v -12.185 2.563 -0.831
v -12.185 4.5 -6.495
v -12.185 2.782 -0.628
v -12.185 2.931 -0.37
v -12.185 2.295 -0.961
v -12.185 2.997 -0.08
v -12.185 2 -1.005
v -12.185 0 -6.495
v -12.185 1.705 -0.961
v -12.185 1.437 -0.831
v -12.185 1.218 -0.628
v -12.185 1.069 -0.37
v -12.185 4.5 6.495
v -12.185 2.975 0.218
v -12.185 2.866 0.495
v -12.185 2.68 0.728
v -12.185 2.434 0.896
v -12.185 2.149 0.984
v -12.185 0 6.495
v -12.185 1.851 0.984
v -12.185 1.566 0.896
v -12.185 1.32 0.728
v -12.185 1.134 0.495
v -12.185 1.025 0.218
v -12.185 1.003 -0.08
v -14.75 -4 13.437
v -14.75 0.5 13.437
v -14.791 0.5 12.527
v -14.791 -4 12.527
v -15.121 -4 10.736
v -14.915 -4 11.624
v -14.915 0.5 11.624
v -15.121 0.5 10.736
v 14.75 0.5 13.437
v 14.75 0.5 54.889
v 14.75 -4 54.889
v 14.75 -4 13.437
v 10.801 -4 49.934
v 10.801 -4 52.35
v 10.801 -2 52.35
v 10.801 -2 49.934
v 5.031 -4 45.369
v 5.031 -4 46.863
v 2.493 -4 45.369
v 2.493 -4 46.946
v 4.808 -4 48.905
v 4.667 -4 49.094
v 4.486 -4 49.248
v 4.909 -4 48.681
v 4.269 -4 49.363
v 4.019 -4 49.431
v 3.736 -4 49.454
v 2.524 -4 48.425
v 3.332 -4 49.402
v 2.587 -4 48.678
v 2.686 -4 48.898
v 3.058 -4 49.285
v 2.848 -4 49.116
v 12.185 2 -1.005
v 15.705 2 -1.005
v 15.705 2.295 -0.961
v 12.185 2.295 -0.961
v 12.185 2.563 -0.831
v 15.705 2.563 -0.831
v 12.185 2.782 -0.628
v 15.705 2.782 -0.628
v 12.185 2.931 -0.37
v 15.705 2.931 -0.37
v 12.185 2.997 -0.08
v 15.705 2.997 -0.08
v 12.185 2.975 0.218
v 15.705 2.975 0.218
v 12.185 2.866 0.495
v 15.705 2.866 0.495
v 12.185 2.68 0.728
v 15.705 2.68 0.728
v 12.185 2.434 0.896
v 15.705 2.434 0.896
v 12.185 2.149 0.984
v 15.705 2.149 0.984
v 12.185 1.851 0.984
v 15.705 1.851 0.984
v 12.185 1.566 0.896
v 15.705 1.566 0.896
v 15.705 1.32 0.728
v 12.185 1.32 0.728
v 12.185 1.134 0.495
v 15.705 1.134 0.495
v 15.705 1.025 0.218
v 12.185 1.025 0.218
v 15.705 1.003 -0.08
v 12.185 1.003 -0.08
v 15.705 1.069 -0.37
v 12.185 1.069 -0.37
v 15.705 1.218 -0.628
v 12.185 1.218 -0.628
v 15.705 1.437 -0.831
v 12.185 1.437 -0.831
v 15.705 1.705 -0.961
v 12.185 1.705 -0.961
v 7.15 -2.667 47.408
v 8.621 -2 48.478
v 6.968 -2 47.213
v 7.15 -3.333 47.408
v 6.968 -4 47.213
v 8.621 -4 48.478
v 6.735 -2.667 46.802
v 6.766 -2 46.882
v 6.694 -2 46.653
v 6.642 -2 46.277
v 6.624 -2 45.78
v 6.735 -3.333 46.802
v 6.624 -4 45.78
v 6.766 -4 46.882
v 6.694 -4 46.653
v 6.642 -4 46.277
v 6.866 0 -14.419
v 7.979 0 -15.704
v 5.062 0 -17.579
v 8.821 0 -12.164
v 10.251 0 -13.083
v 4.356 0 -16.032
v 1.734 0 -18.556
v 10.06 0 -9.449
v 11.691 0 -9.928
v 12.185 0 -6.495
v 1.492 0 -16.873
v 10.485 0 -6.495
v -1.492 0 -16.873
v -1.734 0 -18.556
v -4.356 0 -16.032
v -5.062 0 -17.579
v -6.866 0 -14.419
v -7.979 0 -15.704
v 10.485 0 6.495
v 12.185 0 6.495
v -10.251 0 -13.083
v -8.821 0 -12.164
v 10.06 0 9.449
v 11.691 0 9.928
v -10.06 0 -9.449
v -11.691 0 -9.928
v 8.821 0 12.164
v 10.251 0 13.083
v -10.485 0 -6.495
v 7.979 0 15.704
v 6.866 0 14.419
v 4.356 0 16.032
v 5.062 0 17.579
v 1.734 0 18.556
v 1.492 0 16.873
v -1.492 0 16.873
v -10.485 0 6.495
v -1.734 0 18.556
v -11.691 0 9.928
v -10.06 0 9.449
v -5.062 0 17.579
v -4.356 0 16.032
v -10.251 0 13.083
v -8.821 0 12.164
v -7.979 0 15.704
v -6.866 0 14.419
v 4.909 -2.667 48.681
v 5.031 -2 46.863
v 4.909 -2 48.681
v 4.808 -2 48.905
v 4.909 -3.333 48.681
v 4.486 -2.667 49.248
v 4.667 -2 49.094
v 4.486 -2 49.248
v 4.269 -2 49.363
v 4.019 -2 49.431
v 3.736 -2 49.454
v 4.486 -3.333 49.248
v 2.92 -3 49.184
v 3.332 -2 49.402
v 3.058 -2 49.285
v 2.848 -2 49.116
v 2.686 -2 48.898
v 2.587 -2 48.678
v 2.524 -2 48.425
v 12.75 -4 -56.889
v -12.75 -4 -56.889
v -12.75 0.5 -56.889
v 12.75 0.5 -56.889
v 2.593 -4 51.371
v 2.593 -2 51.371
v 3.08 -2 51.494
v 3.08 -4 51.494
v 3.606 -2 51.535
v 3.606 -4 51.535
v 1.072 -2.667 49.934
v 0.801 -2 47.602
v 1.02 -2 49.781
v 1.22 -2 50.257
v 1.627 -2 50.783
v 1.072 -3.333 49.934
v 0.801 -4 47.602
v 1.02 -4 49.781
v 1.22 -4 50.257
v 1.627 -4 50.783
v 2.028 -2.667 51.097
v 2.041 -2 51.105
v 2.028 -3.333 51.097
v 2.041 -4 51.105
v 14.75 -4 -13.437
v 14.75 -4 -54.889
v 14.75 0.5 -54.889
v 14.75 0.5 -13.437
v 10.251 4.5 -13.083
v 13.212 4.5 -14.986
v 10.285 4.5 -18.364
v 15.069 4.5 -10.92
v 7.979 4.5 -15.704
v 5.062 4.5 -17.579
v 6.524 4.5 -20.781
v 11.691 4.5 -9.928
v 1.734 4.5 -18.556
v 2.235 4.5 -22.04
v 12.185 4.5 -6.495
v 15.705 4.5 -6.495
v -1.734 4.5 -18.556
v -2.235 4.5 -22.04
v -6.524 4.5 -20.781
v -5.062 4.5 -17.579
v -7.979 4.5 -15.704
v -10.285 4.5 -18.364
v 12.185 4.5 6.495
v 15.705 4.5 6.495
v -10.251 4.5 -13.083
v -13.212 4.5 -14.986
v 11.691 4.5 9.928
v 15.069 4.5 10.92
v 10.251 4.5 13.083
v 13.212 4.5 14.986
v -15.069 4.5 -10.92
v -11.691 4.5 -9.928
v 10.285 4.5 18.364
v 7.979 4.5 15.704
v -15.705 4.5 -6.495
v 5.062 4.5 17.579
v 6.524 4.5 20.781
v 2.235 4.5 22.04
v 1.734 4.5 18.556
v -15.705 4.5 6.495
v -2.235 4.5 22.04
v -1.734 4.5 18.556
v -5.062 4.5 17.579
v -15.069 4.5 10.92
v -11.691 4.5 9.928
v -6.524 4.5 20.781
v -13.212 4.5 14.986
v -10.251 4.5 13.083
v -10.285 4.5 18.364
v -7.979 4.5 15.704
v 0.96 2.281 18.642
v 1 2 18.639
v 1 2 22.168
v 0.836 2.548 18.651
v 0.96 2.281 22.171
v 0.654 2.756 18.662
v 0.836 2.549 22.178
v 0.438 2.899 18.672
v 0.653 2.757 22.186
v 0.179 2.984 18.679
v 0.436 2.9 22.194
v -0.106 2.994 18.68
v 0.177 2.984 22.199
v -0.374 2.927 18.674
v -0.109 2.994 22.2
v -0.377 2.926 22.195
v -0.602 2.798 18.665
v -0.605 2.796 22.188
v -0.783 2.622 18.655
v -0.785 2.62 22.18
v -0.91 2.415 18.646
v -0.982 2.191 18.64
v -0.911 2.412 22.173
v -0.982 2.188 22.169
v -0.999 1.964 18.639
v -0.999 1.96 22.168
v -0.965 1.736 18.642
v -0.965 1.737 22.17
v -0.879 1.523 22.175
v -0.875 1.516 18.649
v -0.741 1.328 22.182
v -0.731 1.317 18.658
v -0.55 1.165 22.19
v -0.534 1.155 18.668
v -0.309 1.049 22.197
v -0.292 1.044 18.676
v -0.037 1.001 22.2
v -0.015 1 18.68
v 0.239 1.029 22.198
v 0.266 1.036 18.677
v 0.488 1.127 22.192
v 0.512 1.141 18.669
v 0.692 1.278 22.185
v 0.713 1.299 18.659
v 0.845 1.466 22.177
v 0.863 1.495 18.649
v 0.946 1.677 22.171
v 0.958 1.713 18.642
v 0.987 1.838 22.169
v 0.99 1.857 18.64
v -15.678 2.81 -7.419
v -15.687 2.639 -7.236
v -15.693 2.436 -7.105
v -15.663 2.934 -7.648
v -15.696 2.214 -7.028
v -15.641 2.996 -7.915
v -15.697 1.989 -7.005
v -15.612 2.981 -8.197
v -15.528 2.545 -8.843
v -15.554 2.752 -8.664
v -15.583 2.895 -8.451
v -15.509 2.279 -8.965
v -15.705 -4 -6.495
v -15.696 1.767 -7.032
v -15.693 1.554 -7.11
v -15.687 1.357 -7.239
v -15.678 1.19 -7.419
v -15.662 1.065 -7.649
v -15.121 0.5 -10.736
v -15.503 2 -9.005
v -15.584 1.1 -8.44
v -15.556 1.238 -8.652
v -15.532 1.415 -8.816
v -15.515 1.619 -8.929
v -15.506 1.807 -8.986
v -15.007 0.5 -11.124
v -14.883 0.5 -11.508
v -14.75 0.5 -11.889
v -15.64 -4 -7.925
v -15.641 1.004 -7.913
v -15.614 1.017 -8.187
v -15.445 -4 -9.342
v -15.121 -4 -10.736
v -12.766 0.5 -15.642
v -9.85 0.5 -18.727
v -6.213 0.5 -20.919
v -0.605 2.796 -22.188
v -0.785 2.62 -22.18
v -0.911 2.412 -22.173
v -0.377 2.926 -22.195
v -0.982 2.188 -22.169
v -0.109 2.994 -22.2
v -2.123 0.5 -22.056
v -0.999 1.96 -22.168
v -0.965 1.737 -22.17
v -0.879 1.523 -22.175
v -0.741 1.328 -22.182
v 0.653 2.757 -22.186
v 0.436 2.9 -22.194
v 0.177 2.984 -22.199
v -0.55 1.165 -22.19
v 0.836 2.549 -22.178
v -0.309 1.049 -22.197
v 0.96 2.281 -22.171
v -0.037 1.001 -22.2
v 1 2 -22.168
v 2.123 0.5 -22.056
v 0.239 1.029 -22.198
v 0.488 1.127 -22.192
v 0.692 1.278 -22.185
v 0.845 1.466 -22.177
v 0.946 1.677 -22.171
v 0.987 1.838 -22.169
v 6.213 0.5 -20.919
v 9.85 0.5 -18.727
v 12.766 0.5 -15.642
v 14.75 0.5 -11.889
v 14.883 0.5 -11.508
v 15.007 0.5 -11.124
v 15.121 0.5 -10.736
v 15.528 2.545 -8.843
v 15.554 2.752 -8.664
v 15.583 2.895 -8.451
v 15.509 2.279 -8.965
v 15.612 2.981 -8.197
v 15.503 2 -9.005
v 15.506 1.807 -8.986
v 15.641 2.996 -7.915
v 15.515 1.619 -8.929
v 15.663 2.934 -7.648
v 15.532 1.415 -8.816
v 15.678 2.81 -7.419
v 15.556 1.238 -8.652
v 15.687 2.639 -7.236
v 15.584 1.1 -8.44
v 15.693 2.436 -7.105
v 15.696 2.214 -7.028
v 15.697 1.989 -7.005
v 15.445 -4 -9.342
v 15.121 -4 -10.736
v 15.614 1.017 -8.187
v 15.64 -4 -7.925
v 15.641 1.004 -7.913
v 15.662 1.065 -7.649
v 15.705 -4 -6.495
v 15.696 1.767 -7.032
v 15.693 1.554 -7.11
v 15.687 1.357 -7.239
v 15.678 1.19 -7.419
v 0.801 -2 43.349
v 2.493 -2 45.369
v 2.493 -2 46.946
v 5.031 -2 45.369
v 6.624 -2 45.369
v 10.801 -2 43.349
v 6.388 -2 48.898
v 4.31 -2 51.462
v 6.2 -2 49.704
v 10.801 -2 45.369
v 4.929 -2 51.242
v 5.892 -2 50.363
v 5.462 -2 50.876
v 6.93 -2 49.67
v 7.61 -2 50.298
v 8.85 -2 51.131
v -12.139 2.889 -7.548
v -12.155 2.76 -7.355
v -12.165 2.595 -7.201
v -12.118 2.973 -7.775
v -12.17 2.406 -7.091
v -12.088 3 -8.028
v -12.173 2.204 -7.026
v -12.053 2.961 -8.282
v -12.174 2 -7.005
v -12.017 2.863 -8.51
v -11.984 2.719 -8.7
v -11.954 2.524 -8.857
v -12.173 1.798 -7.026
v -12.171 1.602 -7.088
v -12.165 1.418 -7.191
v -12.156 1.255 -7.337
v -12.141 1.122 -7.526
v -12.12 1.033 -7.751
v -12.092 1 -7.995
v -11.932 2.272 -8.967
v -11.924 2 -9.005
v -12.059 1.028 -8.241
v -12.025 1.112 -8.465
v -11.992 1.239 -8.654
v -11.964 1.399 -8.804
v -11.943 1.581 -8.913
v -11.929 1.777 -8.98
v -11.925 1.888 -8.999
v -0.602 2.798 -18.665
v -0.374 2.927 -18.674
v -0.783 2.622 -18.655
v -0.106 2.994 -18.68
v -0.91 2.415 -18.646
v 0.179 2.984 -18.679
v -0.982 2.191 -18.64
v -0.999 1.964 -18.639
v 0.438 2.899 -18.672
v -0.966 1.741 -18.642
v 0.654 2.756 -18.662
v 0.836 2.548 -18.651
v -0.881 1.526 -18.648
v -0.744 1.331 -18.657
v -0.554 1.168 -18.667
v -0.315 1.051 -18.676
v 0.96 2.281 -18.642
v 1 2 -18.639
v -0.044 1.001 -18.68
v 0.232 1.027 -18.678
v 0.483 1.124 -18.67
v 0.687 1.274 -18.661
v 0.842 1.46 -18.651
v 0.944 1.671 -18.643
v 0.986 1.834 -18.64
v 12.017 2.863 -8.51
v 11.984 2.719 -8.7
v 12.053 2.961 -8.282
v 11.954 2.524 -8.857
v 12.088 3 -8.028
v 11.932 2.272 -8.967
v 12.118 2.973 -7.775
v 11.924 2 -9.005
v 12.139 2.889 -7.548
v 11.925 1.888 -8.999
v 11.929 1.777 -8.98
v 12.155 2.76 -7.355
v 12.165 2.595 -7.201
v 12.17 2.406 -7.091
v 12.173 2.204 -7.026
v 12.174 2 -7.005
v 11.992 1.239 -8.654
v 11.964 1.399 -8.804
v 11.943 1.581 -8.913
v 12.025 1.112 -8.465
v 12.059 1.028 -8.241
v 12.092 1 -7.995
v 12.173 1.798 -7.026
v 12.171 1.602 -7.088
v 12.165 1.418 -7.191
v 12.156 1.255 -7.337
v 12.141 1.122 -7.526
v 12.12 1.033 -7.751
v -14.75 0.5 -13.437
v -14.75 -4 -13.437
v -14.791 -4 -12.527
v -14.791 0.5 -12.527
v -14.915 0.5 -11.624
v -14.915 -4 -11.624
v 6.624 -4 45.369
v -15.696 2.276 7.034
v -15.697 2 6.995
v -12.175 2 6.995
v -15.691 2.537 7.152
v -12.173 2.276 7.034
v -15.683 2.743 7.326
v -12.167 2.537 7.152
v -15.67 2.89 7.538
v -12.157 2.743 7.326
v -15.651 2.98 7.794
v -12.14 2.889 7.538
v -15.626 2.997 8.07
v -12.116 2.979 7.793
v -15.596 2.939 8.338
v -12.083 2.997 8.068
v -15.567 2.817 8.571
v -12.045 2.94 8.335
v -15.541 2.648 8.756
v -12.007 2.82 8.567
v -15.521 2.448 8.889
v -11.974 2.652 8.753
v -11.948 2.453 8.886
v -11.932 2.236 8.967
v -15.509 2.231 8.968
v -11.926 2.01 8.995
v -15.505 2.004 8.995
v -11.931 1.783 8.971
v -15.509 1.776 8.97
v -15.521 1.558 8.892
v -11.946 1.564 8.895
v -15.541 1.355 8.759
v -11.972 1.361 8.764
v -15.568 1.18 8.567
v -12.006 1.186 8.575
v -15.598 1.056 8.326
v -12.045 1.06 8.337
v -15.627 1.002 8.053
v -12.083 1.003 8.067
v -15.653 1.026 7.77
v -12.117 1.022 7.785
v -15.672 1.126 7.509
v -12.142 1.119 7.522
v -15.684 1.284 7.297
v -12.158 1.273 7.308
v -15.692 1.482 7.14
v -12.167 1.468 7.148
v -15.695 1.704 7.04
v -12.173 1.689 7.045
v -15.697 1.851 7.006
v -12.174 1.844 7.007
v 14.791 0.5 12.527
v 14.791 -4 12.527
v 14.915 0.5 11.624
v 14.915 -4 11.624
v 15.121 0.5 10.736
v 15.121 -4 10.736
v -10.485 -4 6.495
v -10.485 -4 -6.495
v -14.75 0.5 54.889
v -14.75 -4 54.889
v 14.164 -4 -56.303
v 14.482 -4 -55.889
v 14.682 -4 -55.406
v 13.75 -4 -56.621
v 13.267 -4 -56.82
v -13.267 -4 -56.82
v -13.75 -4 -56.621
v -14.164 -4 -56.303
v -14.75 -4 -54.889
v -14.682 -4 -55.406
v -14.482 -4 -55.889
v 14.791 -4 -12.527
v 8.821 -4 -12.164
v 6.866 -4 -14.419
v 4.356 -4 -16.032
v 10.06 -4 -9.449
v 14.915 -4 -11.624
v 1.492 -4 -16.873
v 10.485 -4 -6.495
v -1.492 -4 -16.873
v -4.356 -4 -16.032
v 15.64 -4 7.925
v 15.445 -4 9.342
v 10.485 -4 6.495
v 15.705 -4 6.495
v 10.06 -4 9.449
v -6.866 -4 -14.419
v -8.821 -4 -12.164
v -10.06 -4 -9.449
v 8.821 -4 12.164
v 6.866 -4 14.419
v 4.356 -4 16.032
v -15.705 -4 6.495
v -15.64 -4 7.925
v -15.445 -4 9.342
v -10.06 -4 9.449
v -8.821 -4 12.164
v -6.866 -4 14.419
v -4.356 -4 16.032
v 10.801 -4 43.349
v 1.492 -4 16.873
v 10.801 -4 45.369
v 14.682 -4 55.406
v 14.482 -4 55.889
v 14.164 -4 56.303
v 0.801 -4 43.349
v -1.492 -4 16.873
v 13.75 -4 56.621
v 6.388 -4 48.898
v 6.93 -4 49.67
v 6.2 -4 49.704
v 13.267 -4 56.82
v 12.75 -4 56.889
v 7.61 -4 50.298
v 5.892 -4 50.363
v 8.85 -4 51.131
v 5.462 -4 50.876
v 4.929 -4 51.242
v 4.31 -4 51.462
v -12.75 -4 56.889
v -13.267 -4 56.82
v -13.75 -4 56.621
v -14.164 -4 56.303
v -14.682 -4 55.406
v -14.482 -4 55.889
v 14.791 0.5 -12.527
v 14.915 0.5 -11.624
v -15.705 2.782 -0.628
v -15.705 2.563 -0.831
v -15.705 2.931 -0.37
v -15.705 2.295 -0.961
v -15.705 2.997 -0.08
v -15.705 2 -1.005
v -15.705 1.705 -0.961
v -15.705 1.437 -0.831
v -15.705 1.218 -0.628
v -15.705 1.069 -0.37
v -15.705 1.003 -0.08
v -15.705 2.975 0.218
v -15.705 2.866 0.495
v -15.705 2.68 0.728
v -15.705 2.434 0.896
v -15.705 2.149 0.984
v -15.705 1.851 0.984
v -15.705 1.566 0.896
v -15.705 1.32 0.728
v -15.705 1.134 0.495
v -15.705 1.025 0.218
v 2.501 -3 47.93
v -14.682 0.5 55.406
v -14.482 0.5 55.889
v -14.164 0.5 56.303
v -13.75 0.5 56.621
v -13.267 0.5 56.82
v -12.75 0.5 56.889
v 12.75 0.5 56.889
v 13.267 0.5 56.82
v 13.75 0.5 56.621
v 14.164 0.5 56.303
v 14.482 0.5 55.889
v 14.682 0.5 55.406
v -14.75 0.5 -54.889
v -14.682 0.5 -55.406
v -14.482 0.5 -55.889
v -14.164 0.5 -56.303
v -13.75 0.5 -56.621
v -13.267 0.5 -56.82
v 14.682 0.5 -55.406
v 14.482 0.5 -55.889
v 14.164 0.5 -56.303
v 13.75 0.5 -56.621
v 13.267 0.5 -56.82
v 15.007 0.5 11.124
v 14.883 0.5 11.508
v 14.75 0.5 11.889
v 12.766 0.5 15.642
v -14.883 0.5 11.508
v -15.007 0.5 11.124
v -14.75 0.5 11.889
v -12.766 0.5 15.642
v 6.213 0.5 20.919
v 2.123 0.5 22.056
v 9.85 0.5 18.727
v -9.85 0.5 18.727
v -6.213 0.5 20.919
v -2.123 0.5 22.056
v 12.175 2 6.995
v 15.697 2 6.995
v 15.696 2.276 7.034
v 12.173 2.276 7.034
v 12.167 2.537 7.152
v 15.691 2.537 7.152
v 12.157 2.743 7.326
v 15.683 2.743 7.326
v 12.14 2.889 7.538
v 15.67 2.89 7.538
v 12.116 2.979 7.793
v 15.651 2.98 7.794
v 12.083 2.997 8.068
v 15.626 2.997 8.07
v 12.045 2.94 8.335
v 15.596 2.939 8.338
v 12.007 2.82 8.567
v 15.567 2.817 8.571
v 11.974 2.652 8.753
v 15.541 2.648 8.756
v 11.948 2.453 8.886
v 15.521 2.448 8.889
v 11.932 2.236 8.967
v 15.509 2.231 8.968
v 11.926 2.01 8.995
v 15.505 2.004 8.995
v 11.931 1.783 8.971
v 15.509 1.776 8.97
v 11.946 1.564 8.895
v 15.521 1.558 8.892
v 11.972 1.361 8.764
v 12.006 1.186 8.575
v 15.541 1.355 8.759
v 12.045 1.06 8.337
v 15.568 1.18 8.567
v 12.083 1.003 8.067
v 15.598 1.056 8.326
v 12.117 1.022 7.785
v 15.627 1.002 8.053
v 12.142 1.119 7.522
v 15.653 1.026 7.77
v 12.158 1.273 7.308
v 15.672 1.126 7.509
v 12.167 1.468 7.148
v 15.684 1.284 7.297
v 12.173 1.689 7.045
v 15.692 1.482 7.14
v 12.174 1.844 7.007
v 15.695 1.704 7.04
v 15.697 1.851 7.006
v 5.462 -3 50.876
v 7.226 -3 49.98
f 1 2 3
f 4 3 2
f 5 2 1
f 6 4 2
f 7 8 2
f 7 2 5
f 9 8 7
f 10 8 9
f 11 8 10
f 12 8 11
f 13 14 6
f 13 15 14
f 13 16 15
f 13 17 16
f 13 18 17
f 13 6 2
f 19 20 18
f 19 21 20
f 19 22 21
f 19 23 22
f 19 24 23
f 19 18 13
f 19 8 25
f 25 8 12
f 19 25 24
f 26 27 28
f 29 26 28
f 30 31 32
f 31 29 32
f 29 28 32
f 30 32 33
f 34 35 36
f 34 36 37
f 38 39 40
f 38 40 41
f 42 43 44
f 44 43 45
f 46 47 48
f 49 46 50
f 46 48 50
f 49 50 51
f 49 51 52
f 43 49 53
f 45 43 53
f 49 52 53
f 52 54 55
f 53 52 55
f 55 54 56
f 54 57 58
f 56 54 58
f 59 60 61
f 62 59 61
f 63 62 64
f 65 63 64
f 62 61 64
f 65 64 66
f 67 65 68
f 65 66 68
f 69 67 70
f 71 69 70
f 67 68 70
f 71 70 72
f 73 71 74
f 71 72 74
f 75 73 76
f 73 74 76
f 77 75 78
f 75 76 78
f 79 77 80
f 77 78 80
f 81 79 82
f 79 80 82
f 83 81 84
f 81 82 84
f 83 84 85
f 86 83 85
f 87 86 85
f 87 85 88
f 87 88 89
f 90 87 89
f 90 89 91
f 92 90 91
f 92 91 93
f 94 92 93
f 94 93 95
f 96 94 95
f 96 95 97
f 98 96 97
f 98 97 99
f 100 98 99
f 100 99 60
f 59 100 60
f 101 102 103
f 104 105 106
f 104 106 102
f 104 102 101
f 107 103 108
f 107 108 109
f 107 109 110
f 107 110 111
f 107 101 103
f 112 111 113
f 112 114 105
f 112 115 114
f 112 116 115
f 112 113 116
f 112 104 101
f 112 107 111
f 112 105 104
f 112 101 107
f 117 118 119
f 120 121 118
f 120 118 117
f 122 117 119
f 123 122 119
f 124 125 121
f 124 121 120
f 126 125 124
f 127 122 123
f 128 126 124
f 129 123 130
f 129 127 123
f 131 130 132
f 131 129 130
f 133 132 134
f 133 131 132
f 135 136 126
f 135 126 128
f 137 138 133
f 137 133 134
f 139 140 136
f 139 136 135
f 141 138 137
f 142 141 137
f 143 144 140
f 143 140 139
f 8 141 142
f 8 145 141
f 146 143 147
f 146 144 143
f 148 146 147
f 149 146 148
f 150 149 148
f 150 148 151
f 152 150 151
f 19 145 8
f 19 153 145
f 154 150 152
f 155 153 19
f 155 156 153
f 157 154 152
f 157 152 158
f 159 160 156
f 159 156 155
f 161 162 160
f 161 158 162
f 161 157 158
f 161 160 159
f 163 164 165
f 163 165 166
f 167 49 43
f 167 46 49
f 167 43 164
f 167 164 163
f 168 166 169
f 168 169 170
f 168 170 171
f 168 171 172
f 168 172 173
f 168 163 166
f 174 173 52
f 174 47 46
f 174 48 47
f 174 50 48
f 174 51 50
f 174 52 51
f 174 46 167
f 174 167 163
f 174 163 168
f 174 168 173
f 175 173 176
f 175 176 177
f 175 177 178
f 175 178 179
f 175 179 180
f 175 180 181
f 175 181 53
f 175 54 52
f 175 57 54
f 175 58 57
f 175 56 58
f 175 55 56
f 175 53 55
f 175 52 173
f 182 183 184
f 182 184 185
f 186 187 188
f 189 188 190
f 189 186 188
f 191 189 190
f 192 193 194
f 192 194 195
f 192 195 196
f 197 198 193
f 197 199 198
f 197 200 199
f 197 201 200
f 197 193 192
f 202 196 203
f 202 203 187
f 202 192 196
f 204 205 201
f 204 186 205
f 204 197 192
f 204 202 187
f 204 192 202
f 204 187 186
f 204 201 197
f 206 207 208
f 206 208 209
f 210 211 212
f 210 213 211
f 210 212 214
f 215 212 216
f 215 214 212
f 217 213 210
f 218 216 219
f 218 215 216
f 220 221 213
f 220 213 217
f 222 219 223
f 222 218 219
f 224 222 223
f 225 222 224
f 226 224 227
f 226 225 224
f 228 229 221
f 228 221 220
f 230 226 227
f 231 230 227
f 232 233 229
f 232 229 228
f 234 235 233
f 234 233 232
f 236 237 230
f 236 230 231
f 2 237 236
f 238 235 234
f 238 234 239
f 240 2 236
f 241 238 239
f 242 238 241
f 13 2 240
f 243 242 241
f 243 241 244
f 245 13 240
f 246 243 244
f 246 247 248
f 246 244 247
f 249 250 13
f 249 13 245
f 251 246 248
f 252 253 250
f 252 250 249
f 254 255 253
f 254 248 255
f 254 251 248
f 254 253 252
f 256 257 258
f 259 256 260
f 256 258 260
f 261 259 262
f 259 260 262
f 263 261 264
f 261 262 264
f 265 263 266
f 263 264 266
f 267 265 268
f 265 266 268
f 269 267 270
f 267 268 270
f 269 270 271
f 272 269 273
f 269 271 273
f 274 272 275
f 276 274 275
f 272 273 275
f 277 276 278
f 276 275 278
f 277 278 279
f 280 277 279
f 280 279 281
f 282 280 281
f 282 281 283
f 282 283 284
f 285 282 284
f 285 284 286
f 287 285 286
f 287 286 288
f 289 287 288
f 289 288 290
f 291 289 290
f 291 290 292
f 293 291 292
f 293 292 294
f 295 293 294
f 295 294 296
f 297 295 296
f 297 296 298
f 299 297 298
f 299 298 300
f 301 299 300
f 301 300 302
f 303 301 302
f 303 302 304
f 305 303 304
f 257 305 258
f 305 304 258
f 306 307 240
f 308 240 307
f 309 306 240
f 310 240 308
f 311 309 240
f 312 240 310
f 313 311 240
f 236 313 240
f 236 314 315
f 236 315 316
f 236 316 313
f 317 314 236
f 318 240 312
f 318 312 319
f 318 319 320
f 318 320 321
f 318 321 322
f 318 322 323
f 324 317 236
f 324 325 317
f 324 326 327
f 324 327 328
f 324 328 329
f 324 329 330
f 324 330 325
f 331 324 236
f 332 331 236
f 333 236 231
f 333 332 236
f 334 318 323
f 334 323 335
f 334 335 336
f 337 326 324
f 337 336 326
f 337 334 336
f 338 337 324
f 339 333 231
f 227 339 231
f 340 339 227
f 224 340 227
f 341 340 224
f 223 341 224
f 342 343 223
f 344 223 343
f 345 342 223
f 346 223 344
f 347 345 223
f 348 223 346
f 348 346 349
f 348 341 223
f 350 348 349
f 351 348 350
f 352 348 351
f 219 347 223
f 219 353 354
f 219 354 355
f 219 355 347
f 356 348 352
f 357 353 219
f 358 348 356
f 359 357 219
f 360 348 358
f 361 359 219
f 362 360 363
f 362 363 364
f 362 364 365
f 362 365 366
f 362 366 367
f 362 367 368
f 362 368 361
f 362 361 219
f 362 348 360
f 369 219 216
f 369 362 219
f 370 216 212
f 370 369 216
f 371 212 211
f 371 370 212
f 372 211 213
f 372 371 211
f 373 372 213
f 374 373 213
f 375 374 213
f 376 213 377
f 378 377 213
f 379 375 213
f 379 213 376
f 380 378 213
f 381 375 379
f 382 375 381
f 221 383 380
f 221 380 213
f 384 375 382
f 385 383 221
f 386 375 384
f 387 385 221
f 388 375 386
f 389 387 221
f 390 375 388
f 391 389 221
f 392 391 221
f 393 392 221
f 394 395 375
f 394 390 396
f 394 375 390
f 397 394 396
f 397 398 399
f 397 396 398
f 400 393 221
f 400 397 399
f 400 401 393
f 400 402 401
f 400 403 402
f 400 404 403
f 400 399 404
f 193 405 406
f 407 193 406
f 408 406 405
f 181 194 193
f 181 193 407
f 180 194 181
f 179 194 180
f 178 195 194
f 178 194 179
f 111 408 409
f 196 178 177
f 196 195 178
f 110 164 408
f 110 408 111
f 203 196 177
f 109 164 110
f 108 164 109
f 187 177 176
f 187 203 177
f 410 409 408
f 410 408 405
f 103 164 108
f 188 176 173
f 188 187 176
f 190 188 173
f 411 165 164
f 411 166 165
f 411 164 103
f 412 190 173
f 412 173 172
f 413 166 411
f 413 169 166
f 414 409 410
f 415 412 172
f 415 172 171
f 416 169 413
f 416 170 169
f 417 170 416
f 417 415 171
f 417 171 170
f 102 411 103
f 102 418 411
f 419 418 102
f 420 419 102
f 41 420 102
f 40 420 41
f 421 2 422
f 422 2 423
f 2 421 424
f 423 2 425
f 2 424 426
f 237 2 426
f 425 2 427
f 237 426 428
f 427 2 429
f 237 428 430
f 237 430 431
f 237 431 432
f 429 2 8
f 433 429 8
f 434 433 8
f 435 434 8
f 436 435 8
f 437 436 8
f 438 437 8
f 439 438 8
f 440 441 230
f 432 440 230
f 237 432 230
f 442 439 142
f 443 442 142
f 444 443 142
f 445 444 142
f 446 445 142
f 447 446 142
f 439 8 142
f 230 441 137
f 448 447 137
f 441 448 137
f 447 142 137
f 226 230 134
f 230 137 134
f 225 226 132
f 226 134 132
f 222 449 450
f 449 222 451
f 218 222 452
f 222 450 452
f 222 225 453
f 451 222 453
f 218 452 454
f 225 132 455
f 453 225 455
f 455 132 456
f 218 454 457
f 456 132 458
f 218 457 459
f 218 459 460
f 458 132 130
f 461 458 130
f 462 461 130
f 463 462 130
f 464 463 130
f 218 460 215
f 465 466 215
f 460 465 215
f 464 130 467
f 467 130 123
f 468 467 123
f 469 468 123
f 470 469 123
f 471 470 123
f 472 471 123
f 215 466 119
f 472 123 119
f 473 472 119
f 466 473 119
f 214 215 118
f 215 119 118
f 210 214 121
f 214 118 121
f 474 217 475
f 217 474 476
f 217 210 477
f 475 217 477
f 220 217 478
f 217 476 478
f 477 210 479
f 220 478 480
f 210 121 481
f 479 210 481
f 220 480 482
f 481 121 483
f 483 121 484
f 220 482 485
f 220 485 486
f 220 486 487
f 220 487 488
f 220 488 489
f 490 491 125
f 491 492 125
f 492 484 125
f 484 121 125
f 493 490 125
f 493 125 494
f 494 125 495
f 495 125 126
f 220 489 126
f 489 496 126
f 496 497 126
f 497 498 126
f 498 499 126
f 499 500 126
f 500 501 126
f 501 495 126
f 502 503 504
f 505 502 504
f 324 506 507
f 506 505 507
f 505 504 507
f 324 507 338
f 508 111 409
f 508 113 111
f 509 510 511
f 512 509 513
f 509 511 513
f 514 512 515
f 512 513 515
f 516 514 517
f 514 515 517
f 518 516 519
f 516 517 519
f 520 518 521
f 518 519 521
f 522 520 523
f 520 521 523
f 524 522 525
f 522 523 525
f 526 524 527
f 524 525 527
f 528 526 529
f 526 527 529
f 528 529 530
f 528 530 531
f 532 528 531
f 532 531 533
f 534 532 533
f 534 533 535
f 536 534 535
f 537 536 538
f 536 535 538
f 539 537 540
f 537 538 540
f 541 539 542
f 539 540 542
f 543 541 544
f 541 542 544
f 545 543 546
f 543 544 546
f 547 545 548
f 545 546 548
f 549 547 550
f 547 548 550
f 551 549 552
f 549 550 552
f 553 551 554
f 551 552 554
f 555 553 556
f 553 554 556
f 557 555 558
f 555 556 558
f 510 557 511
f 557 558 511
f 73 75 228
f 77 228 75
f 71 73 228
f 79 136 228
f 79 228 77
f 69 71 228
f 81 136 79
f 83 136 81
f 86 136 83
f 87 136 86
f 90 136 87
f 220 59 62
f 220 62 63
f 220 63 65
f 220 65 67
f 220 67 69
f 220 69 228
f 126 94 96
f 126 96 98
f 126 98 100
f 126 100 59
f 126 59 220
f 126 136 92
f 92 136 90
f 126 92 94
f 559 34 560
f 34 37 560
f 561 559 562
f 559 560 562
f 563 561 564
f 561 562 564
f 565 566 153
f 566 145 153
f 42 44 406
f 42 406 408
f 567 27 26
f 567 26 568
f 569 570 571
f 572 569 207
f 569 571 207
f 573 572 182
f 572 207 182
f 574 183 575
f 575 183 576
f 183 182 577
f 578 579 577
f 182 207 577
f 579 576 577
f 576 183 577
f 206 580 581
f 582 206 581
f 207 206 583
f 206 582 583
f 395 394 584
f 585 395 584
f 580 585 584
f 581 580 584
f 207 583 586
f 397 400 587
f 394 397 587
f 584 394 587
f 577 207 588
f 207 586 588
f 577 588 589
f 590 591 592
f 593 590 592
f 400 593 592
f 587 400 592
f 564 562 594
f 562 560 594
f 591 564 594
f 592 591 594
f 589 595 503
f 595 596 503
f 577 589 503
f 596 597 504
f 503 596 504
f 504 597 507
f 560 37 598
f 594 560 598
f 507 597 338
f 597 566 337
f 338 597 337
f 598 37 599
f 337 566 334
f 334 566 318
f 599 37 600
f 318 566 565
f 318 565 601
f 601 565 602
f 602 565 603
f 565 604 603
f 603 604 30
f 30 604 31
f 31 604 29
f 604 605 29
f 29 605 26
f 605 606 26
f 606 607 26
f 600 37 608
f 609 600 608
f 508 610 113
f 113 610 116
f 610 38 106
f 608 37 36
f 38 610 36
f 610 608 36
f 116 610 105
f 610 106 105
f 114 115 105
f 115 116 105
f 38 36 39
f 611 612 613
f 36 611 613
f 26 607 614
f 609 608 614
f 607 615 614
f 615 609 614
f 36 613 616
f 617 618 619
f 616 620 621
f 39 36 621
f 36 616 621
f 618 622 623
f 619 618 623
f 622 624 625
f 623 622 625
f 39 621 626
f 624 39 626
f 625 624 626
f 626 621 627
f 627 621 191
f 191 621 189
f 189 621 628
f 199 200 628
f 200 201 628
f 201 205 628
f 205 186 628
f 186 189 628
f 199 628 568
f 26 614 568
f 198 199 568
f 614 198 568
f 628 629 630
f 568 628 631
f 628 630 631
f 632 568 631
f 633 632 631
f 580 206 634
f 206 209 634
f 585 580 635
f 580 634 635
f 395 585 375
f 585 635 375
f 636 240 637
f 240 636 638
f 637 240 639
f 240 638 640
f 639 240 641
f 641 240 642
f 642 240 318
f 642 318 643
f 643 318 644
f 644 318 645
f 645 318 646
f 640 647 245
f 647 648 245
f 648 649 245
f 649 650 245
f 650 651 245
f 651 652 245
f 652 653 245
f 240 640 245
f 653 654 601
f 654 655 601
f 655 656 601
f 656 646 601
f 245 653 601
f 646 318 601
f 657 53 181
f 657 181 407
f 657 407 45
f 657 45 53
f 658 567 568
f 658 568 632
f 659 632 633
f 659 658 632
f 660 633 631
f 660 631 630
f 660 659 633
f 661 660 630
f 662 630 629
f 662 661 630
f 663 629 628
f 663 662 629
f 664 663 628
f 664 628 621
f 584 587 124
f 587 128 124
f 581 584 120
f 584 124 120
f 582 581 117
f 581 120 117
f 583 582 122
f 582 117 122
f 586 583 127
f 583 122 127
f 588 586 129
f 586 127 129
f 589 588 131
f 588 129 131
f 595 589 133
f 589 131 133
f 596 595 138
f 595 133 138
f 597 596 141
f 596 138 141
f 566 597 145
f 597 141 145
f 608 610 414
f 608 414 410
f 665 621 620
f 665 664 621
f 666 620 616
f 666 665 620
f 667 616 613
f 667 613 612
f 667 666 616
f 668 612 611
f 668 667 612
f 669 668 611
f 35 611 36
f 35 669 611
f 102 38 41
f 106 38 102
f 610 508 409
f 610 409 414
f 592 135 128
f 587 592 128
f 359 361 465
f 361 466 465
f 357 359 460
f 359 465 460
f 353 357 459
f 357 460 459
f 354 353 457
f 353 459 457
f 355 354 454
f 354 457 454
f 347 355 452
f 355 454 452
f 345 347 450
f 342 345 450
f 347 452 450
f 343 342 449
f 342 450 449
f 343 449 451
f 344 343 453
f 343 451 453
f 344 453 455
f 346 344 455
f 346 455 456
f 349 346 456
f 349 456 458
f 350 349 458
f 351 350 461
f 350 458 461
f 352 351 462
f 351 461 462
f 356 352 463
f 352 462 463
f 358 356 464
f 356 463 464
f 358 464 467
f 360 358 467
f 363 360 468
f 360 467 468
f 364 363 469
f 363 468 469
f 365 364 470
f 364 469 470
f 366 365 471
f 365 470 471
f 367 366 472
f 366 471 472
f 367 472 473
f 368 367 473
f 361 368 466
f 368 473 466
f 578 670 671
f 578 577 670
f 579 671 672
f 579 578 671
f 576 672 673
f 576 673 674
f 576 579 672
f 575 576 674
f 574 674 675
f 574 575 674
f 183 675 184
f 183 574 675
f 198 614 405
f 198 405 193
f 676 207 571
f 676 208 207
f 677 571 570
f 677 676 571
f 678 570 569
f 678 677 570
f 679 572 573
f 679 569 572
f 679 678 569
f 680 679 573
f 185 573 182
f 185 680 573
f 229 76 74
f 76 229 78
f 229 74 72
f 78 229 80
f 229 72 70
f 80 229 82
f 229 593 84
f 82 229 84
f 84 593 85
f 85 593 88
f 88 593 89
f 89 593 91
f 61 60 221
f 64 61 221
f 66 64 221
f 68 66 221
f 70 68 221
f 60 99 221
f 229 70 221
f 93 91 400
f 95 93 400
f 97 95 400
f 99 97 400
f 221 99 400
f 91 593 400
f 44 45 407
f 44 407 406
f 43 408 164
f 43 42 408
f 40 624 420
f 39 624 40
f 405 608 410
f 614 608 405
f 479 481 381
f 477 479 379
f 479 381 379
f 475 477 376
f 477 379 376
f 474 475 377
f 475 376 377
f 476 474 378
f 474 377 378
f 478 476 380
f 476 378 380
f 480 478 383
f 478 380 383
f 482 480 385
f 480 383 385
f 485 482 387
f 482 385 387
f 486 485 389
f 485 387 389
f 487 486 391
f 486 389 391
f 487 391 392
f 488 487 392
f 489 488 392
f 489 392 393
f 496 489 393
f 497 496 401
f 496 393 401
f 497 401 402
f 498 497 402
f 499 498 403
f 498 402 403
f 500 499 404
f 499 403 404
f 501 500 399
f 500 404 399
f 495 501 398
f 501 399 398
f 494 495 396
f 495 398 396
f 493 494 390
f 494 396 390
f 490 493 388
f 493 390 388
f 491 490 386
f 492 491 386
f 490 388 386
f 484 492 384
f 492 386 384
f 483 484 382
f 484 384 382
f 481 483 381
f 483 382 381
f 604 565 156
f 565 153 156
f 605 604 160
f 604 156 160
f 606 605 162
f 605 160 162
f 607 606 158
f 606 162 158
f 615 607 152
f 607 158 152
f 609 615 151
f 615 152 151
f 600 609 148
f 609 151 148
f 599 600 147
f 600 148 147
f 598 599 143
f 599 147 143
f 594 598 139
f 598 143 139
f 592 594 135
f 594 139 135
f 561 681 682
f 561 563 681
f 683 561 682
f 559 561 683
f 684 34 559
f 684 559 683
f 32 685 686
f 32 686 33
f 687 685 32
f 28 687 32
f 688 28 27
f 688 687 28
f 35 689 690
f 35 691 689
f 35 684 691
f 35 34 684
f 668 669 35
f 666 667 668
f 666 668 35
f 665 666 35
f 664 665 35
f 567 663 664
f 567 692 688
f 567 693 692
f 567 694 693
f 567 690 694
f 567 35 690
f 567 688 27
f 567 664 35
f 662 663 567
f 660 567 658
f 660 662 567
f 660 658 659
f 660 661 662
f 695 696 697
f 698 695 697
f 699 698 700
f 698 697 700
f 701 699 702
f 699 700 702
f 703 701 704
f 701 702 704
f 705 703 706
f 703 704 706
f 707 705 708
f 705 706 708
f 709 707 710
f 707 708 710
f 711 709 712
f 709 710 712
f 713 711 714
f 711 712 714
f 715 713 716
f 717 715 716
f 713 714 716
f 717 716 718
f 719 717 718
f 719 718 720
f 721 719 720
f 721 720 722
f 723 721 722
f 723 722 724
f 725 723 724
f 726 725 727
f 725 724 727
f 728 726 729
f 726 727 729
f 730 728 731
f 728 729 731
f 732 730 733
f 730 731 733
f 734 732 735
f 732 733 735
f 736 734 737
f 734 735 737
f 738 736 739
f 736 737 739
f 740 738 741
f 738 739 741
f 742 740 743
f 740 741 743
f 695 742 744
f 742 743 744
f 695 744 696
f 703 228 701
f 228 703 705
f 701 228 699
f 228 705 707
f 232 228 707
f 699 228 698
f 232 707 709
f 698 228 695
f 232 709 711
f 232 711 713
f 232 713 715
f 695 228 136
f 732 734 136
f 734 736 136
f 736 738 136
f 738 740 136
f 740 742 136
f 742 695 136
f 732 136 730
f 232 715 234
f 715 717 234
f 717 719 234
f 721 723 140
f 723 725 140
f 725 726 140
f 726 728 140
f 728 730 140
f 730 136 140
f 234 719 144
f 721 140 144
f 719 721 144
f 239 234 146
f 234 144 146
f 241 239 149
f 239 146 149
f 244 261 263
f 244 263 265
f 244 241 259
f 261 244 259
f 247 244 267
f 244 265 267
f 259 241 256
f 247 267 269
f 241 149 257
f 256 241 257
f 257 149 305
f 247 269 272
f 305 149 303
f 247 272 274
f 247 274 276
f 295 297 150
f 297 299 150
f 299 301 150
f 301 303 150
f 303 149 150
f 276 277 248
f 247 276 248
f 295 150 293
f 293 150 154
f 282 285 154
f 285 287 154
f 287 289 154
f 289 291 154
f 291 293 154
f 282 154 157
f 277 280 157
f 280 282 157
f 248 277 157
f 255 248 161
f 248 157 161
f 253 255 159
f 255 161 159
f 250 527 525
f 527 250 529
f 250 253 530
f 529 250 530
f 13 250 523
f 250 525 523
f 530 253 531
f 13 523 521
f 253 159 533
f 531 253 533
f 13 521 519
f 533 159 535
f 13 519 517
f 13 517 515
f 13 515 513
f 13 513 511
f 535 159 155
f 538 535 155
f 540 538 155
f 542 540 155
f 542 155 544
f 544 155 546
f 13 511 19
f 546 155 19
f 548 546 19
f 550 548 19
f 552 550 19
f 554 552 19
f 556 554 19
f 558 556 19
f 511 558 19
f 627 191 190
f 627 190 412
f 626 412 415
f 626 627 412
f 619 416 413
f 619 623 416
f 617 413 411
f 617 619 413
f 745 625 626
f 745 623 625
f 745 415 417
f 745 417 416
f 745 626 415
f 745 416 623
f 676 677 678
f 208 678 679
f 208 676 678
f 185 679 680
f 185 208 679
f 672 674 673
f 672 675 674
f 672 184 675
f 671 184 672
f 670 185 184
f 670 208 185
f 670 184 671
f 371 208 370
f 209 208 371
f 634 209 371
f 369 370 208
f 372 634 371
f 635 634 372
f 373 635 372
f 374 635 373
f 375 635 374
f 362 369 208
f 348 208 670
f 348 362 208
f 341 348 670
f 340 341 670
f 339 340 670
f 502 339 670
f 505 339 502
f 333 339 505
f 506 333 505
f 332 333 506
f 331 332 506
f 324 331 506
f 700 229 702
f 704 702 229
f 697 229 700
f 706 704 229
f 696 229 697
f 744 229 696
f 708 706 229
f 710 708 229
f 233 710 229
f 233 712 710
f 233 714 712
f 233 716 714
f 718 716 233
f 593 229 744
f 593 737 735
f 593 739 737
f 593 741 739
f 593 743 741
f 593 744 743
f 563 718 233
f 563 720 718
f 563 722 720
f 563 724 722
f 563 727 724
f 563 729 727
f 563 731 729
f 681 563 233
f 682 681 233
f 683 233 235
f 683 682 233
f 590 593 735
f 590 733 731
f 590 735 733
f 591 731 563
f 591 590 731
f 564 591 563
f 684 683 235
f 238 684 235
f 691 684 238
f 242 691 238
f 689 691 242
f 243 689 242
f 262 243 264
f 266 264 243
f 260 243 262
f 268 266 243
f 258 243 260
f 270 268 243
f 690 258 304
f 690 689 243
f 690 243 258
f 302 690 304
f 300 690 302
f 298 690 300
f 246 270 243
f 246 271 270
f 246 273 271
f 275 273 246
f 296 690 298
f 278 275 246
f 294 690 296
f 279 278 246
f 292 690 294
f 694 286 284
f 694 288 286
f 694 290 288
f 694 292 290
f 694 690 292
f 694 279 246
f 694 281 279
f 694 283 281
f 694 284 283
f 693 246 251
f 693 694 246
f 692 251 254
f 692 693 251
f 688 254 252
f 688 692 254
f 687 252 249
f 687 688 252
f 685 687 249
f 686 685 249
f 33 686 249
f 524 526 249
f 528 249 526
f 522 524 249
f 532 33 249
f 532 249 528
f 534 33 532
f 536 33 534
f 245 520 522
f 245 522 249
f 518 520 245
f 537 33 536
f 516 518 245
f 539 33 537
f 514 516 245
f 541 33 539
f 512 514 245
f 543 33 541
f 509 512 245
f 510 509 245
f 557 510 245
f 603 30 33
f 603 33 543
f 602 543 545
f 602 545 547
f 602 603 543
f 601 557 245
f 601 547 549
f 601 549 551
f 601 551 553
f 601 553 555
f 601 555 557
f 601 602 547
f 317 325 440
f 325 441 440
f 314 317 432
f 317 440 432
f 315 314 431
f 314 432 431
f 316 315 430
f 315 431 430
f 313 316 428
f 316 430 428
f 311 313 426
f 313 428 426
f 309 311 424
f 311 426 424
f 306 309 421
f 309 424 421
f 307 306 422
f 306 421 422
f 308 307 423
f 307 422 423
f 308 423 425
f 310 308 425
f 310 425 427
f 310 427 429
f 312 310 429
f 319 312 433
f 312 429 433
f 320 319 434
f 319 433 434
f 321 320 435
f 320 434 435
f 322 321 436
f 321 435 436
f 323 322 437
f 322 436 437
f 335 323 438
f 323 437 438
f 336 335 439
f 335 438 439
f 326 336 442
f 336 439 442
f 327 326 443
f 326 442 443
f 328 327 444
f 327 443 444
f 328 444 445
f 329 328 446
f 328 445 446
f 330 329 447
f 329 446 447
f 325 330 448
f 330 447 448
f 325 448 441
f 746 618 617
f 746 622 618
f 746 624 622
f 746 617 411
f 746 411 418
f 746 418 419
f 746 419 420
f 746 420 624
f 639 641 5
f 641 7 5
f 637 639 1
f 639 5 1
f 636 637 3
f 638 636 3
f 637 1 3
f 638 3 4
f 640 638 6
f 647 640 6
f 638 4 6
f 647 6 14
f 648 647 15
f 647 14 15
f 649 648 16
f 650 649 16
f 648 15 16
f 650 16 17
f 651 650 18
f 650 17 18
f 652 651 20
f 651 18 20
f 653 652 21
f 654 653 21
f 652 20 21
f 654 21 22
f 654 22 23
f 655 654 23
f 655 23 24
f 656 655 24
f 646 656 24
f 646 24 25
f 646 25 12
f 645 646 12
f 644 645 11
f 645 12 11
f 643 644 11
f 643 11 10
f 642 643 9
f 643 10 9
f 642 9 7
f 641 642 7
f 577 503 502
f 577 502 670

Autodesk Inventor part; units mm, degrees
ref_plane "YZ Plane" through (0, 0, 0) normal (1, 0, 0) x (0, 1, 0)
ref_plane "XZ Plane" through (0, 0, 0) normal (0, 1, 0) x (-1, 0, 0)
ref_plane "XY Plane" through (0, 0, 0) normal (0, 0, 1) x (1, 0, 0)
sketch "Chamber_outline" plane through (0, 0, 0) normal (0, 1, 0) x (-1, 0, 0)
  line L0 (0, -6.495) -> (0, 6.495) construction
  line L1 (12.185, -6.495) -> (12.185, 6.495)
  line L2 (-12.185, 6.495) -> (-12.185, -6.495)
  arc A0 (-12.185, -6.495) -> (12.185, -6.495) centre (0, -6.495) ccw
  arc A1 (12.185, 6.495) -> (-12.185, 6.495) centre (0, 6.495) ccw
  line L3 (15.7049, -6.495) -> (15.7049, 6.495)
  arc A2 (15.7049, 6.495) -> (-15.7049, 6.495) centre (0, 6.495) ccw
  line L4 (-15.7049, 6.495) -> (-15.7049, -6.495)
  arc A3 (-15.7049, -6.495) -> (15.7049, -6.495) centre (0, -6.495) ccw
  line L5 (12.185, 0) -> (-12.185, 0)
  line L6 (14.7497, -11.8886) -> (14.7497, -56.8886)
  line L7 (14.7497, -56.8886) -> (-14.7497, -56.8886)
  line L8 (-14.7497, -56.8886) -> (-14.7497, -11.8886)
  line L9 (14.7497, 11.8886) -> (14.7497, 56.8886)
  line L10 (14.7497, 56.8886) -> (-14.7497, 56.8886)
  line L11 (-14.7497, 56.8886) -> (-14.7497, 11.8886)
  line L12 (10.485, -6.495) -> (10.485, 6.495)
  arc A4 (10.485, 6.495) -> (-10.485, 6.495) centre (0, 6.495) ccw
  line L13 (-10.485, 6.495) -> (-10.485, -6.495)
  arc A5 (-10.485, -6.495) -> (10.485, -6.495) centre (0, -6.495) ccw
  point P0 (0, 0)
  point P1 (0, 0)
  point P2 (0, 0)
  point P3 (0, -56.8886)
  point P4 (0, 56.8886)
  point P5 (-14.7497, 11.8886)
  point P6 (14.7497, 11.8886)
  point P7 (0, -18.68)
  point P8 (0, 18.68)
  dimension "d18" = 24.37
  dimension "d26" = 1.7
  dimension "d58" = 45
  dimension "d82" = 37.36
extrude "Extrusion3" add sketch "Chamber_outline" along normal blind 4.5 contours A3 L4 A2 L3
extrude "Extrusion4" add sketch "Chamber_outline" along normal blind 0.5 contours L6 L7 L8 A3 | A2 L11 L10 L9
extrude "Extrusion5" add sketch "Chamber_outline" against normal blind 4 contours A0 L2 L5 L13 A5 L12 L1 | L5 L12 A4 L13 L2 A1 L1 | A3 L4 A2 L3 | L6 L7 L8 A3 | A2 L11 L10 L9
fillet "Fillet1" radius 10 2 edges at (-14.7497, -2, 11.8886) (-14.7497, 0.25, 11.8886)
fillet "Fillet2" radius 10 6 edges at (-14.7497, -2, -11.8886) (-14.7497, 0.25, -11.8886) (14.7497, 0.25, -11.8886) (14.7497, -2, -11.8886) (14.7497, 0.25, 11.8886) (14.7497, -2, 11.8886)
fillet "Fillet3" radius 2 8 edges at (-14.7497, -2, -56.8886) (-14.7497, 0.25, -56.8886) (-14.7497, -2, 56.8886) (-14.7497, 0.25, 56.8886) (14.7497, -2, 56.8886) (14.7497, 0.25, 56.8886) (14.7497, -2, -56.8886) (14.7497, 0.25, -56.8886)
sketch "Sketch9" plane through (0, -4, 0) normal (0, -1, 0) x (1, 0, 0)
  line L0 (0.801, 42.3276) -> (0.801, 45.3727) construction
  line L1 (0.801, 45.3727) -> (3.851, 45.3727) construction
  line L2 (3.851, 45.3727) -> (3.851, 42.3276) construction
  line L3 (3.851, 42.3276) -> (0.801, 42.3276) construction
  line L4 (10.801, 43.349) -> (0.801, 43.349)
  line L5 (0.801, 43.349) -> (0.801, 47.602)
  spline S0 degree 2 poles (0.801, 47.602) (0.801, 49.2102) (1.3422, 50.6584) (2.7141, 51.5349) (3.6059, 51.5349) knots 0 0 0 1 2 3 3 3
  spline S1 degree 2 poles (3.6059, 51.5349) (4.7263, 51.5349) (6.1973, 50.2163) (6.3879, 48.8977) knots 0 0 0 1 2 2 2
  spline S2 degree 2 poles (6.3879, 48.8977) (6.769, 49.5532) (7.6836, 50.4069) (8.8498, 51.131) knots 0 0 0 1 2 2 2
  line L6 (8.8498, 51.131) -> (10.801, 52.3505)
  line L7 (10.801, 52.3505) -> (10.801, 49.9343)
  line L8 (10.801, 49.9343) -> (8.6211, 48.4785)
  spline S3 degree 2 poles (8.6211, 48.4785) (7.455, 47.6935) (6.8452, 47.1218) (6.6242, 46.4816) (6.6242, 45.7804) knots 0 0 0 1 2 3 3 3
  line L9 (6.6242, 45.7804) -> (6.6242, 45.3688)
  line L10 (6.6242, 45.3688) -> (10.801, 45.3688)
  line L11 (10.801, 45.3688) -> (10.801, 43.349)
  line L12 (5.0312, 45.3688) -> (5.0312, 46.8627)
  spline S4 degree 2 poles (5.0312, 46.8627) (5.0312, 48.3185) (4.7873, 49.0426) (4.1851, 49.4541) (3.7355, 49.4541) knots 0 0 0 1 2 3 3 3
  spline S5 degree 2 poles (3.7355, 49.4541) (3.2324, 49.4541) (2.6074, 48.913) (2.5236, 48.4252) knots 0 0 0 1 2 2 2
  spline S6 degree 2 poles (2.5236, 48.4252) (2.4931, 48.1737) (2.4931, 46.9465) knots 0 0 0 1 1 1
  line L13 (2.4931, 46.9465) -> (2.4931, 45.3688)
  line L14 (2.4931, 45.3688) -> (5.0312, 45.3688)
  point P0 (0, 0)
extrude "Extrusion14" cut sketch "Sketch9" against normal blind 2
sketch "Sketch3" plane through (15.7049, 4.5, 6.495) normal (1, 0, 0) x (0, 0, -1)
  circle A0 centre (6.5, -2.5) radius 1
  line L0 (0, 0) -> (12.99, 0) projected
  circle A1 centre (14.5, -2.5) radius 1
  circle A2 centre (-1.5, -2.5) radius 1
  point P0 (6.495, -4.5)
  dimension "d41" = 2
  dimension "d43" = 2.5
  dimension "d85" = 2
  dimension "d86" = 2
  dimension "d87" = 8
  dimension "d88" = 8
extrude "Extrusion6" cut sketch "Sketch3" against normal through all
sketch "Sketch4" plane through (-12.7497, 0.5, 56.8886) normal (0, 0, 1) x (1, 0, 0)
  circle A0 centre (12.7497, 1.5) radius 1
  line L0 (28.4546, 4) -> (-2.9552, 4) projected
  point P0 (12.7497, -0.5)
  point P1 (12.7497, 4)
  dimension "d36" = 2
  dimension "d42" = 2.5
extrude "Extrusion7" cut sketch "Sketch4" against normal through all
sketch "Sketch5" plane through (0, -4, 0) normal (0, -1, 0) x (1, 0, 0)
  line L0 (-10.485, -6.495) -> (-10.485, 6.495) projected
  line L1 (-10.485, -6.495) -> (-8.4271, -6.495)
  line L2 (-7.9121, 0.245) -> (-7.9121, 6.495)
  line L3 (-7.9121, 6.495) -> (-10.485, 6.495)
  line L4 (10.485, -6.495) -> (10.485, 6.495) projected
  line L5 (10.485, -6.495) -> (8.4271, -6.495)
  line L6 (8.3305, -0.2609) -> (8.3305, 6.495)
  line L7 (8.3305, 6.495) -> (10.485, 6.495)
  arc A0 (10.485, 6.495) -> (-10.485, 6.495) centre (0, 6.495) ccw projected
  arc A1 (-10.485, -6.495) -> (10.485, -6.495) centre (0, -6.495) ccw projected
  arc A2 (-10.485, -6.495) -> (10.485, -6.495) centre (0, -6.495) ccw projected
  line L8 (-7.079, -14.2295) -> (-5.3711, -11.1831)
  line L9 (-5.3711, -11.1831) -> (-3.3516, -12.3154)
  line L10 (-3.3516, -12.3154) -> (-5.1945, -15.6028)
  line L11 (-7.4267, 14.3644) -> (-5.7188, 11.3181)
  line L12 (-5.7188, 11.3181) -> (-3.6001, 12.5059)
  line L13 (-3.6001, 12.5059) -> (-5.4497, 15.8051)
  line L14 (3.586, 12.9764) -> (5.1976, 15.6011)
  line L15 (5.8011, 11.7346) -> (3.586, 12.9764)
  line L16 (7.1611, 14.1536) -> (5.8011, 11.7346)
  line L17 (-10.485, -6.495) -> (10.8395, -6.495)
  line L18 (1.9666, 16.7939) -> (1.9666, -0.2609)
  line L19 (-2.0003, -16.7874) -> (-2.0003, -6.495)
  line L20 (-1.0812, 0.245) -> (-1.0812, 16.9241)
  line L21 (4.8643, -15.7834) -> (4.8643, -6.495)
  line L22 (-7.9121, 0.245) -> (-1.0812, 0.245)
  line L23 (1.9666, -0.2609) -> (8.3305, -0.2609)
  point P0 (0, 0)
  point P1 (1.5355, -6.495)
  point P2 (-7.079, -14.2295)
  point P3 (-5.1945, -15.6028)
  point P4 (-5.3016, 15.5409)
  point P5 (-7.2574, 14.0624)
  point P6 (7.5128, 14.2848)
  point P7 (5.4529, 15.8033)
  point P8 (8.4271, -6.495)
  point P9 (4.8643, -15.7834)
sketch "Sketch6" plane through (0, -4, 0) normal (0, -1, 0) x (1, 0, 0)
  ellipse E0 centre (0, -5) end of major axis (0.355, -4.9802) minor radius 0.3556 projected
  circle A0 centre (1, -5.9999) radius 0.3556 projected
  circle A1 centre (0, -5.9999) radius 0.3556 projected
  circle A2 centre (-1, -6) radius 0.3556 projected
  circle A3 centre (-1, -4.9999) radius 0.3556 projected
  circle A4 centre (1, -5) radius 0.3556 projected
  circle A5 centre (1, -6.9999) radius 0.3556 projected
  ellipse E1 centre (0, -7) end of major axis (0.3551, -6.9801) minor radius 0.3556 projected
  ellipse E2 centre (-1, -7) end of major axis (-0.645, -6.9801) minor radius 0.3556 projected
  ellipse E3 centre (6, -3) end of major axis (6.355, -2.9802) minor radius 0.3556 projected
  circle A6 centre (5, -3) radius 0.3556 projected
  ellipse E4 centre (4, -2.9999) end of major axis (4.3551, -2.9801) minor radius 0.3556 projected
  circle A7 centre (4, -4) radius 0.3556 projected
  ellipse E5 centre (5, -4) end of major axis (5.355, -3.9802) minor radius 0.3556 projected
  ellipse E6 centre (6, -3.9999) end of major axis (6.3551, -3.9801) minor radius 0.3556 projected
  circle A8 centre (6, -2) radius 0.3556 projected
  circle A9 centre (5, -2) radius 0.3556 projected
  circle A10 centre (4, -1.9999) radius 0.3556 projected
  circle A11 centre (3, -12) radius 0.3556 projected
  circle A12 centre (4, -11.9999) radius 0.3556 projected
  circle A13 centre (3, -10.9999) radius 0.3556 projected
  circle A14 centre (4, -11) radius 0.3556 projected
  circle A15 centre (2, -10.9999) radius 0.3556 projected
  circle A16 centre (2, -12) radius 0.3556 projected
  circle A17 centre (2, -13) radius 0.3555 projected
  ellipse E7 centre (3, -13) end of major axis (3.0198, -13.355) minor radius 0.3556 projected
  ellipse E8 centre (4, -13) end of major axis (4.0198, -13.355) minor radius 0.3556 projected
  circle A18 centre (1.5, 9) radius 0.3556 projected
  circle A19 centre (1.5, 8) radius 0.3556 projected
  circle A20 centre (0.5, 8) radius 0.3556 projected
  ellipse E9 centre (-0.5, 8.0001) end of major axis (-0.1449, 8.0199) minor radius 0.3556 projected
  circle A21 centre (-0.5, 9) radius 0.3556 projected
  circle A22 centre (-0.5, 10) radius 0.3556 projected
  circle A23 centre (1.5, 10.0001) radius 0.3556 projected
  ellipse E10 centre (0.5, 10) end of major axis (0.5198, 9.645) minor radius 0.3556 projected
  circle A24 centre (0.5, 9) radius 0.3556 projected
  circle A25 centre (3, -12) radius 0.4056
  circle A26 centre (0, -5.9999) radius 0.4056
  circle A27 centre (5, -3) radius 0.4056
  circle A28 centre (0.5, 9) radius 0.4056
  circle A29 centre (-1, -6) radius 0.4056
  point P0 (0, 0)
  dimension "d63" = 0.05
  dimension "d64" = 0.05
  dimension "d65" = 0.05
  dimension "d66" = 0.05
  dimension "d77" = 0.05
sketch "Sketch7" plane through (0, -0.5, 0) normal (0, 1, 0) x (1, 0, 0)
  arc A0 (12.185, 6.495) -> (-12.185, 6.495) centre (0, 6.495) ccw projected
  arc A1 (10.285, 6.495) -> (-10.285, 6.495) centre (0, 6.495) ccw
  line L0 (-10.485, -6.495) -> (-10.485, 6.495) projected
  arc A2 (10.485, 6.495) -> (-10.485, 6.495) centre (0, 6.495) ccw projected
  line L1 (10.485, 6.495) -> (10.485, -6.495) projected
  arc A3 (-10.485, -6.495) -> (10.485, -6.495) centre (0, -6.495) ccw projected
  line L2 (-12.185, -6.495) -> (-12.185, 6.495) projected
  arc A4 (-12.185, -6.495) -> (12.185, -6.495) centre (0, -6.495) ccw projected
  line L3 (12.185, 6.495) -> (12.185, -6.495) projected
  arc A5 (12.185, 6.495) -> (-12.185, 6.495) centre (0, 6.495) ccw projected
  arc A6 (-12.185, -6.495) -> (12.185, -6.495) centre (0, -6.495) ccw projected
  line L4 (12.185, 6.495) -> (12.185, -6.495) projected
  line L5 (-12.185, -6.495) -> (-12.185, 6.495) projected
  line L6 (-10.285, -6.495) -> (-10.285, 6.495)
  arc A7 (10.285, 6.495) -> (-10.285, 6.495) centre (0, 6.495) ccw
  line L7 (10.285, 6.495) -> (10.285, -6.495)
  arc A8 (-10.285, -6.495) -> (10.285, -6.495) centre (0, -6.495) ccw
  circle A9 centre (5, 3) radius 0.4056 projected
  circle A10 centre (0, 5.9999) radius 0.4056 projected
  circle A11 centre (0.5, -9) radius 0.4056 projected
  circle A12 centre (3, 12) radius 0.4056 projected
  line L8 (10.485, 6.495) -> (4.8643, 6.495) projected
  line L9 (4.8643, 6.495) -> (4.8643, 15.7834) projected
  arc A13 (4.8643, 15.7834) -> (-2.0003, 16.7874) centre (0, 6.495) ccw projected
  line L10 (-2.0003, 16.7874) -> (-2.0003, 6.495) projected
  line L11 (-2.0003, 6.495) -> (-10.485, 6.495) projected
  line L12 (-10.485, -6.495) -> (-10.485, 6.495) projected
  line L13 (-10.485, -6.495) -> (-7.9121, -6.495) projected
  line L14 (-7.9121, -6.495) -> (-7.9121, -0.245) projected
  line L15 (-7.9121, -0.245) -> (-1.0812, -0.245) projected
  line L16 (-1.0812, -0.245) -> (-1.0812, -16.9241) projected
  arc A14 (-1.0812, -16.9241) -> (1.9666, -16.7939) centre (0, -6.495) ccw projected
  line L17 (1.9666, -16.7939) -> (1.9666, 0.2609) projected
  line L18 (1.9666, 0.2609) -> (8.3305, 0.2609) projected
  line L19 (8.3305, 0.2609) -> (8.3305, -6.495) projected
  line L20 (8.3305, -6.495) -> (10.485, -6.495) projected
  line L21 (10.485, 6.495) -> (10.485, -6.495) projected
  line L22 (7.1611, -14.1536) -> (5.8011, -11.7346) projected
  line L23 (5.8011, -11.7346) -> (3.586, -12.9764) projected
  line L24 (3.586, -12.9764) -> (5.1976, -15.6011) projected
  arc A15 (5.1976, -15.6011) -> (7.1611, -14.1536) centre (0, -6.495) ccw projected
  line L25 (-7.079, 14.2295) -> (-5.3711, 11.1831) projected
  line L26 (-5.3711, 11.1831) -> (-3.3516, 12.3154) projected
  line L27 (-3.3516, 12.3154) -> (-5.1945, 15.6028) projected
  arc A16 (-5.1945, 15.6028) -> (-7.079, 14.2295) centre (0, 6.495) ccw projected
  line L28 (-5.3016, -15.5409) -> (-3.6001, -12.5059) projected
  line L29 (-3.6001, -12.5059) -> (-5.7188, -11.3181) projected
  line L30 (-5.7188, -11.3181) -> (-7.2574, -14.0624) projected
  arc A17 (-7.2574, -14.0624) -> (-5.3016, -15.5409) centre (0, -6.495) ccw projected
  circle A18 centre (-1, 6) radius 0.4056 projected
  line L31 (0, -16.78) -> (0, 0)
  line L32 (-10.285, 0) -> (0, 0)
  line L33 (0, 0) -> (10.285, 0)
  line L34 (0, 0) -> (0, 16.78)
  point P0 (-1.0812, -16.723)
  point P1 (1.9666, -16.5902)
  point P2 (10.285, -6.495)
  point P3 (10.285, 6.495)
  point P4 (4.8643, 15.557)
  point P5 (-2.0003, 16.5836)
  point P6 (-10.285, 6.495)
  point P7 (-10.285, -6.495)
  point P8 (5.0929, -15.4305)
  point P9 (7.0601, -13.974)
  point P10 (-7.1563, -13.8821)
  point P11 (-5.2037, -15.3664)
  point P12 (-5.0967, 15.4283)
  point P13 (-6.9785, 14.0503)
  dimension "d83" = 33.56
equation "\"metal_holder_thickness\" = 5"
equation "\"metal_holder_slot_length\" = 5"
properties part number "holder_base"
